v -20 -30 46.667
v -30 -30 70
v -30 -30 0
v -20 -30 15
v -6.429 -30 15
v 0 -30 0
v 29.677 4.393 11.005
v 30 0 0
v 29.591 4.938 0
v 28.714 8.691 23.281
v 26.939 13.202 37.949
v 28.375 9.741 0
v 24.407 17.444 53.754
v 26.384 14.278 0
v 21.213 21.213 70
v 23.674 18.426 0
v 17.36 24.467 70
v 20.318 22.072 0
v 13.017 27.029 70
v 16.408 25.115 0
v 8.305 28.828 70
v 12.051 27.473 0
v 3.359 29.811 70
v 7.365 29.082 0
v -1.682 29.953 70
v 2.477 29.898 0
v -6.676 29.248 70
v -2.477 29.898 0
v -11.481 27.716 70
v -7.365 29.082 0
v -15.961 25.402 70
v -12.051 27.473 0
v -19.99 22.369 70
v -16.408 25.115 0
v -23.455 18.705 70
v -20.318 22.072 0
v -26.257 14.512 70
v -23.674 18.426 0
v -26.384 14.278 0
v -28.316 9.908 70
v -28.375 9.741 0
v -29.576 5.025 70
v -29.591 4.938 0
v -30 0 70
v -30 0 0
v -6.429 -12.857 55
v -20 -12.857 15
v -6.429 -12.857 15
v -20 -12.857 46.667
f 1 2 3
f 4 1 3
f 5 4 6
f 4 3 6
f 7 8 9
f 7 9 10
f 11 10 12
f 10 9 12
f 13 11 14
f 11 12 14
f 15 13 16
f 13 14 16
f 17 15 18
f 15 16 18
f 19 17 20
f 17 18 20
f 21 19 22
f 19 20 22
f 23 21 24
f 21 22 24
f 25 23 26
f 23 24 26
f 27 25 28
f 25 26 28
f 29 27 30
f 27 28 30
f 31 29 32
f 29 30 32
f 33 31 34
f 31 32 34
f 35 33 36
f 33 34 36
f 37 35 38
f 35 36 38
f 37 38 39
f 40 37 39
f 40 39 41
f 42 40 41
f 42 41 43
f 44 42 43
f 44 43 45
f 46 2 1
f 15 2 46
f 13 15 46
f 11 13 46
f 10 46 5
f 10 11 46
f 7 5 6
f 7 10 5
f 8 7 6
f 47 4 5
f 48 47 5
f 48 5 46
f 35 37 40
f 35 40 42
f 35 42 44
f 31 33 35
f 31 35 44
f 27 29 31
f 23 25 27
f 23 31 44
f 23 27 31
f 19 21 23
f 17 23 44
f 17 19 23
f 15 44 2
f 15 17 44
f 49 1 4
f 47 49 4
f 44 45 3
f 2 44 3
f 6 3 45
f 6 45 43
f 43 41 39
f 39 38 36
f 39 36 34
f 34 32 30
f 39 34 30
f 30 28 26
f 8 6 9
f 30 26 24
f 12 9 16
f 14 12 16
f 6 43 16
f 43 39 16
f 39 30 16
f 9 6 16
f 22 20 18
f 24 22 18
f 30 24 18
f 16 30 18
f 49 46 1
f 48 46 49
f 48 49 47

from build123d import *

# Parameters (mm, degrees)
F1_DEPTH = 70
F6_DEPTH = 25


with BuildPart() as f1:
    # F0 (on Top) → F1 (new body)
    with BuildSketch(Plane.XY):
        with BuildLine():
            Line((-30, 0), (-30, -30))
            Line((-30, -30), (0, -30))
            Line((0, -30), (30, 0))
            ThreePointArc((30, 0), (0, 30), (-30, 0))
        make_face()
    extrude(amount=F1_DEPTH)

    # F4: sweep along a path in F3
    with BuildLine(Plane.XY.offset(70)) as f4_path:
        Line((-30, -30), (0, 0))
        Line((0, 0), (21.2132034356, 21.2132034356))
    # F2 (on face) → F4 (sweep, cut)
    with BuildSketch(Plane.XZ.offset(30)):
        Polygon((0, 70), (-30, 70), (0, 0), align=None)
    sweep(path=f4_path.line, mode=Mode.SUBTRACT)

    # F5 (on face) → F6 (cut)
    with BuildSketch(Plane.XZ.offset(30)):
        Polygon((-20, 46.6666666667), (-20, 15), (-6.4285714286, 15), (-6.4285714286, 55), align=None)
    extrude(amount=-F6_DEPTH, mode=Mode.SUBTRACT)

    # F7: sweep along a path in F7_path
    with BuildLine(Plane(origin=(-6.4285714286, -5, 55), x_dir=(0, 1, 0), z_dir=(-1, 0, 0))) as f7_path:
        Line((0, 0), (-7.8571428571, 0))
    # F6_face (on face) → F7 (sweep)
    with BuildSketch(Plane(origin=(-12.9512735327, -5, 32.9974160207), x_dir=(1, 0, 0), z_dir=(0, -1, 0))):
        Polygon((6.5227021041, 22.0025839793), (-7.0487264673, 13.669250646), (-7.0487264673, -17.9974160207), (6.5227021041, -17.9974160207), align=None)
    sweep(path=f7_path.line)


solid = f1.part
